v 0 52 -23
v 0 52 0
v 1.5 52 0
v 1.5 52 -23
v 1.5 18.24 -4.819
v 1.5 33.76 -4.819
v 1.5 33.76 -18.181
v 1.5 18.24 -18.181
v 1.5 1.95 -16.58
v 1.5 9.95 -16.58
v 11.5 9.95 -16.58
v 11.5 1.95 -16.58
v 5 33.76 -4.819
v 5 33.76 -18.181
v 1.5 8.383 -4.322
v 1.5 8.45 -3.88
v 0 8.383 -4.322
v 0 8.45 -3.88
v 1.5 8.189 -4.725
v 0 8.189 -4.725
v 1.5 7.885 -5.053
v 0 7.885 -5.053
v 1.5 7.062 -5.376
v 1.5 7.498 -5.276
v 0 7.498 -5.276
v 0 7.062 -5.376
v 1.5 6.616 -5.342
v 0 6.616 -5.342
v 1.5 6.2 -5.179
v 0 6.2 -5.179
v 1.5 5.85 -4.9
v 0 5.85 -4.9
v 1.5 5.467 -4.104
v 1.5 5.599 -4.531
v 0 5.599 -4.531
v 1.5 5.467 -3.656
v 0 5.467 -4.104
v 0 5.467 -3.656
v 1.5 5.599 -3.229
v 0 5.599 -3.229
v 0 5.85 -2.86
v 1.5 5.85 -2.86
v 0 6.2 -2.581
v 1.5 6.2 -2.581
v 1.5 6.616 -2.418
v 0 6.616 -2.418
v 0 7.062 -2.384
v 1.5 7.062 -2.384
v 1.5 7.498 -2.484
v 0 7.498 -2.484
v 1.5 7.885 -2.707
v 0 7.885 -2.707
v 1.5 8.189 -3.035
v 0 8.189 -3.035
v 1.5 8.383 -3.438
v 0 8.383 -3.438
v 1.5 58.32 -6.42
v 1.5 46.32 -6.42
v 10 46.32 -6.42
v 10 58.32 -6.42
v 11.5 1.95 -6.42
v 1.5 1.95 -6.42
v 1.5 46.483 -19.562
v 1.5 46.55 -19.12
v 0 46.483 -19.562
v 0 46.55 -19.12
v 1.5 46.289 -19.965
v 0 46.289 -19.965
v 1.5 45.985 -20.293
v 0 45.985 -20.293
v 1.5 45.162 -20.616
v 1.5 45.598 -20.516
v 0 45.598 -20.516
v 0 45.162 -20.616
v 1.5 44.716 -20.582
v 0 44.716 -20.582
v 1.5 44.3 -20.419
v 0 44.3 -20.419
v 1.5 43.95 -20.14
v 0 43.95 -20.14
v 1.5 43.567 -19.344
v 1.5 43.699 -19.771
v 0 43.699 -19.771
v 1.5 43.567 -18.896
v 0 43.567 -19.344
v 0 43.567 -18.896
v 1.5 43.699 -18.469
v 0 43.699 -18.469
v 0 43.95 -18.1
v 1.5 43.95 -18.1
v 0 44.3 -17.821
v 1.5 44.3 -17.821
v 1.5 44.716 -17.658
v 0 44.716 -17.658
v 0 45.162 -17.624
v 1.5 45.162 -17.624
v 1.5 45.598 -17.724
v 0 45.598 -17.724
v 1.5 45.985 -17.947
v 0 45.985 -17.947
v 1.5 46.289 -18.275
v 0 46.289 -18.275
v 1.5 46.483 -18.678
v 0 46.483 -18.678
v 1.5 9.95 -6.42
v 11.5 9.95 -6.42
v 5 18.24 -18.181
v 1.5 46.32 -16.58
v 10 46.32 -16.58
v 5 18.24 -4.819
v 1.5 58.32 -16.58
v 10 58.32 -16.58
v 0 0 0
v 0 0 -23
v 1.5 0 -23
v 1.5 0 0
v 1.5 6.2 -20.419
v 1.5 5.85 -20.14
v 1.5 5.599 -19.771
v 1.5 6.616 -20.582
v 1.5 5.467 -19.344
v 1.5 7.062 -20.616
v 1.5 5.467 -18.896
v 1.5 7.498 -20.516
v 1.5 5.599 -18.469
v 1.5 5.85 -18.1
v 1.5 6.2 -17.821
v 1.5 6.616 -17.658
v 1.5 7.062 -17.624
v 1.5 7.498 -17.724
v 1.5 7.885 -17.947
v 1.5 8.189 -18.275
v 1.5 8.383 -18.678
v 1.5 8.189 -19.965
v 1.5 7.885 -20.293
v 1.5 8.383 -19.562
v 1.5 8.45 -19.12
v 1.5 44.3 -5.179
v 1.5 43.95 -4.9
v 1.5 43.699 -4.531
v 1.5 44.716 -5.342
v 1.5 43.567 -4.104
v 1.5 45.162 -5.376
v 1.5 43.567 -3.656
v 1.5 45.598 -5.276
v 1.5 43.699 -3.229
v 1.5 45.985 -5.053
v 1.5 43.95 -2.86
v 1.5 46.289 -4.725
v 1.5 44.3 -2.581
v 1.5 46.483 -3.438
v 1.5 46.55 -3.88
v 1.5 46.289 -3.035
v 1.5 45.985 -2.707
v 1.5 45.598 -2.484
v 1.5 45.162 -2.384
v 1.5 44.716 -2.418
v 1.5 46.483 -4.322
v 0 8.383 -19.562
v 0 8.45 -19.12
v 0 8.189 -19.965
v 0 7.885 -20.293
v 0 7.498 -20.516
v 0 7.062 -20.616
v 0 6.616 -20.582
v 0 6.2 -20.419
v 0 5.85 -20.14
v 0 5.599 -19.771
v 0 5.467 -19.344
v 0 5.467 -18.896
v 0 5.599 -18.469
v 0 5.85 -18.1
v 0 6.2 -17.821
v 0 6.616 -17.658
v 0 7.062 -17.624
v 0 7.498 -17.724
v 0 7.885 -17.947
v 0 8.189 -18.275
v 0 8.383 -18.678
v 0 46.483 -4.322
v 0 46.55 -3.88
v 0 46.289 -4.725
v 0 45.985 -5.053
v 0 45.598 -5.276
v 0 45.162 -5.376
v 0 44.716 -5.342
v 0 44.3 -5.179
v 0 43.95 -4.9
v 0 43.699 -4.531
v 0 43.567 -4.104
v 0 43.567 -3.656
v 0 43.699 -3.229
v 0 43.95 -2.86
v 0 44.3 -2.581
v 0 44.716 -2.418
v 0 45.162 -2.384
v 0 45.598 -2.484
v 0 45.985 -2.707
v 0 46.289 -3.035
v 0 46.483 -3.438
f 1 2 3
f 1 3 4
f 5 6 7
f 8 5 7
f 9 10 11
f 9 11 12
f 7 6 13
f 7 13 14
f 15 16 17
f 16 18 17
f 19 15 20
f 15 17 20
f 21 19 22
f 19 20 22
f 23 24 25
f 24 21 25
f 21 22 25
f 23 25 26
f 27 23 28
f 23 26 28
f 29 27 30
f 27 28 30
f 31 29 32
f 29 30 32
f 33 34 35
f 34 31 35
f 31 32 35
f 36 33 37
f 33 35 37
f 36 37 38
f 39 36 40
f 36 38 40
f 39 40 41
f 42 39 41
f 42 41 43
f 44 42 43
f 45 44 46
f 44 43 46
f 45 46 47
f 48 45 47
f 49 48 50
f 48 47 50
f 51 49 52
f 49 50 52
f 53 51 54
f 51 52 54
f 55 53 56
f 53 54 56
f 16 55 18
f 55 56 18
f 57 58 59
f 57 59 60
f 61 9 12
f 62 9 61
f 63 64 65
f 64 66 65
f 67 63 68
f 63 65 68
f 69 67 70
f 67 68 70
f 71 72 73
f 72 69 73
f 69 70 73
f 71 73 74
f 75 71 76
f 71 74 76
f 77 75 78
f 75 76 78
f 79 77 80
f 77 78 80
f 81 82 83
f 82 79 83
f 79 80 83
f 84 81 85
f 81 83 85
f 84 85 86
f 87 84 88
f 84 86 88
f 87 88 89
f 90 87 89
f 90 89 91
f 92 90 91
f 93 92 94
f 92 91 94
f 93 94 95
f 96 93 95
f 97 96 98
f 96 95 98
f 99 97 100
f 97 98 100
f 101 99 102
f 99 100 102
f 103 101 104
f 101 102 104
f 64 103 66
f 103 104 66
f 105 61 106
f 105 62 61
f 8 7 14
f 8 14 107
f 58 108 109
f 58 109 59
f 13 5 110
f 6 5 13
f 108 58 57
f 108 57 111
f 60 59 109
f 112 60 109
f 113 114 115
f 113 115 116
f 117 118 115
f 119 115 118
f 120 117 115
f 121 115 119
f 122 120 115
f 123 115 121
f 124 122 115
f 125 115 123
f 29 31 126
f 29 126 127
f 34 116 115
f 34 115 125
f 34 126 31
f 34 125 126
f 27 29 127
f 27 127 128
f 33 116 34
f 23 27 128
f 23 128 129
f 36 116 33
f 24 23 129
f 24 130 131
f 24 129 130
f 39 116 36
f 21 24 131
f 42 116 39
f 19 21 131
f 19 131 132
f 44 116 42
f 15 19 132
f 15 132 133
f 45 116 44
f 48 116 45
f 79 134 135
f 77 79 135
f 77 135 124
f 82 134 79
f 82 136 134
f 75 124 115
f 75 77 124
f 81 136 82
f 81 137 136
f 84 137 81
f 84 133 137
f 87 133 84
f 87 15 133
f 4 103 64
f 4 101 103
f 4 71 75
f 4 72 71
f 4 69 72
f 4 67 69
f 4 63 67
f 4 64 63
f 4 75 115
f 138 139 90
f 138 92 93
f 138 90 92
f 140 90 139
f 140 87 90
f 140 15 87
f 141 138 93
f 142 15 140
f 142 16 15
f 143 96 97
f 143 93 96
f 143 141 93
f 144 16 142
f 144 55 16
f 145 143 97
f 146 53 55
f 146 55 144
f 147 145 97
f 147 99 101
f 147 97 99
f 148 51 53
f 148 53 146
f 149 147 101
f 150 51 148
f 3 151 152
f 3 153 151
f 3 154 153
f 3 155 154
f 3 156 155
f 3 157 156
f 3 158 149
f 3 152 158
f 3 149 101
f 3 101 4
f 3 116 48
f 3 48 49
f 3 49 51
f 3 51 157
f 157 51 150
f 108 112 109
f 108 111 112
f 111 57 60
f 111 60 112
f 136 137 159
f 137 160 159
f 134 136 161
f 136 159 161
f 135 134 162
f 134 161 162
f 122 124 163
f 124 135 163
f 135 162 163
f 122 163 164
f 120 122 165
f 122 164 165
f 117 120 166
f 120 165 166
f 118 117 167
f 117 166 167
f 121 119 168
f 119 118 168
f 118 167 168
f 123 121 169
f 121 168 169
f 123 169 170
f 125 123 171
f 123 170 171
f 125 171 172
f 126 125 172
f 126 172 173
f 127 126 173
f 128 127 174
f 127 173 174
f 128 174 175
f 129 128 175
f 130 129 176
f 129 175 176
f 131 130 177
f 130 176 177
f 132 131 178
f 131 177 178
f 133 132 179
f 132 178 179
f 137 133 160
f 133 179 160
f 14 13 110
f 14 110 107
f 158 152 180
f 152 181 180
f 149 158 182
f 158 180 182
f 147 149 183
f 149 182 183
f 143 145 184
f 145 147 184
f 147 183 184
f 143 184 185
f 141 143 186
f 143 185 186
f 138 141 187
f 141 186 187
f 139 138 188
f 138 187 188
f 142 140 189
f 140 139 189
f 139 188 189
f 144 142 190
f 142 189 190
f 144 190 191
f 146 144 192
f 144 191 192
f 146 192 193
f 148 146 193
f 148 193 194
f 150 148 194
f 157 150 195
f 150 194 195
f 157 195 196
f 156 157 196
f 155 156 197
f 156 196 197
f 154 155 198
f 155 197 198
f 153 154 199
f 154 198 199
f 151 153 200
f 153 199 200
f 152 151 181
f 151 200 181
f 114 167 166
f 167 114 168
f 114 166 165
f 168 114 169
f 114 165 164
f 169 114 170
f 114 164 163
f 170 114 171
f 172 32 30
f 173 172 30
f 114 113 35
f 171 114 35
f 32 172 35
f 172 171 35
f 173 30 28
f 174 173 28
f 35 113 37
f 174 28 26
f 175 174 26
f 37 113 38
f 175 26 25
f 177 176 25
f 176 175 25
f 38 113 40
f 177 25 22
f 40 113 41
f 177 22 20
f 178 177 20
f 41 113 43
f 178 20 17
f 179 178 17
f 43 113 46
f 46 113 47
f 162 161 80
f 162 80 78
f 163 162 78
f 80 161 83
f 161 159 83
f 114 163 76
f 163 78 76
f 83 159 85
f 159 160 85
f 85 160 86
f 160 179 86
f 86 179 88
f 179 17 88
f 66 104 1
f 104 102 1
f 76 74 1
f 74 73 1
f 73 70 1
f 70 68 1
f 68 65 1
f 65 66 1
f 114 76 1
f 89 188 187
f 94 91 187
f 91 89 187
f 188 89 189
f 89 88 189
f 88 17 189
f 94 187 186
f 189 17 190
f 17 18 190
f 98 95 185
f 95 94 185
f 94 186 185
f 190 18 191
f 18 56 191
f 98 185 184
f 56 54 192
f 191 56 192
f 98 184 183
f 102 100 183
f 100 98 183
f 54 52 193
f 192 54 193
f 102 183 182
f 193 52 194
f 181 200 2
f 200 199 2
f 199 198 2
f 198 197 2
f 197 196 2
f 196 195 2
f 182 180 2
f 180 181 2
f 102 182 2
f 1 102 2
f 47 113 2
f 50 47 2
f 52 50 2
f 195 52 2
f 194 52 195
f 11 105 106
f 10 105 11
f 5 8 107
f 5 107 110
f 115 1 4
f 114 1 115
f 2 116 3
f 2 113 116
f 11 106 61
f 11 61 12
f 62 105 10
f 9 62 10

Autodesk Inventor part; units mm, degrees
ref_plane "YZ Plane" through (0, 0, 0) normal (1, 0, 0) x (0, 1, 0)
ref_plane "XZ Plane" through (0, 0, 0) normal (0, 1, 0) x (-1, 0, 0)
ref_plane "XY Plane" through (0, 0, 0) normal (0, 0, 1) x (1, 0, 0)
sketch "Sketch1" plane through (0, 0, 0) normal (1, 0, 0) x (0, 1, 0)
  line L0 (0, 0) -> (52, 0)
  line L1 (52, 0) -> (52, -23)
  line L2 (52, -23) -> (0, -23)
  line L3 (0, -23) -> (0, 0)
  circle A0 centre (45.05, -3.88) radius 1.5
  circle A1 centre (45.05, -19.12) radius 1.5
  circle A2 centre (6.95, -3.88) radius 1.5
  circle A3 centre (6.95, -19.12) radius 1.5
  line L4 (45.05, -3.88) -> (6.95, -19.12) construction
  point P0 (26, -11.5)
  point P1 (52, -11.5)
  point P2 (26, 0)
  dimension "d0" = 23
  dimension "d1" = 52
  dimension "d2" = 3
  dimension "d3" = 15.24
  dimension "d4" = 38.1
extrude "Extrusion1" add sketch "Sketch1" along normal blind 1.5
sketch "Sketch2" plane through (1.5, 0, 0) normal (1, 0, 0) x (0, 0, -1)
  line L0 (23, 0) -> (23, 52) construction
  line L1 (23, 52) -> (0, 52) construction
  line L2 (0, 52) -> (0, 0) construction
  line L3 (0, 0) -> (23, 0) construction
  circle A0 centre (19.12, 6.95) radius 1.5 construction
  circle A1 centre (3.88, 6.95) radius 1.5 construction
  circle A2 centre (19.12, 45.05) radius 1.5 construction
  circle A3 centre (3.88, 45.05) radius 1.5 construction
  line L4 (6.42, 58.32) -> (16.58, 58.32)
  line L5 (16.58, 58.32) -> (16.58, 46.32)
  line L6 (16.58, 46.32) -> (6.42, 46.32)
  line L7 (6.42, 46.32) -> (6.42, 58.32)
  line L8 (3.88, 45.05) -> (19.12, 45.05) construction
  point P0 (11.5, 45.05)
  point P1 (11.5, 46.32)
  dimension "d7" = 12
  dimension "d8" = 10.16
  dimension "d9" = 1.27
extrude "Extrusion2" add sketch "Sketch2" along normal blind 8.5 separate body
sketch "Sketch3" plane through (1.5, 0, 0) normal (1, 0, 0) x (0, 0, -1)
  circle A0 centre (3.88, 6.95) radius 1.5 construction
  circle A1 centre (19.12, 6.95) radius 1.5 construction
  line L0 (0, 0) -> (23, 0) construction
  line L1 (6.42, 9.95) -> (16.58, 9.95)
  line L2 (16.58, 9.95) -> (16.58, 1.95)
  line L3 (16.58, 1.95) -> (6.42, 1.95)
  line L4 (6.42, 1.95) -> (6.42, 9.95)
  line L5 (3.88, 6.95) -> (19.12, 6.95) construction
  point P0 (11.5, 6.95)
  point P1 (11.5, 9.95)
  dimension "d12" = 10.16
  dimension "d13" = 8
  dimension "d14" = 3
extrude "Extrusion3" add sketch "Sketch3" along normal blind 10 separate body
sketch "Sketch4" plane through (1.5, 0, 0) normal (1, 0, 0) x (0, 0, -1)
  circle A0 centre (3.88, 45.05) radius 1.5 construction
  circle A1 centre (19.12, 6.95) radius 1.5 construction
  line L0 (4.8192, 33.7605) -> (18.1808, 33.7605)
  line L1 (18.1808, 33.7605) -> (18.1808, 18.2395)
  line L2 (18.1808, 18.2395) -> (4.8192, 18.2395)
  line L3 (4.8192, 18.2395) -> (4.8192, 33.7605)
  line L4 (3.88, 45.05) -> (19.12, 6.95) construction
  point P0 (0, 0)
  point P1 (18.1808, 26)
  point P2 (11.5, 26)
  point P3 (11.5, 33.7605)
extrude "Extrusion4" add sketch "Sketch4" along normal blind 3.5 separate body
properties part number "buck_converter"
